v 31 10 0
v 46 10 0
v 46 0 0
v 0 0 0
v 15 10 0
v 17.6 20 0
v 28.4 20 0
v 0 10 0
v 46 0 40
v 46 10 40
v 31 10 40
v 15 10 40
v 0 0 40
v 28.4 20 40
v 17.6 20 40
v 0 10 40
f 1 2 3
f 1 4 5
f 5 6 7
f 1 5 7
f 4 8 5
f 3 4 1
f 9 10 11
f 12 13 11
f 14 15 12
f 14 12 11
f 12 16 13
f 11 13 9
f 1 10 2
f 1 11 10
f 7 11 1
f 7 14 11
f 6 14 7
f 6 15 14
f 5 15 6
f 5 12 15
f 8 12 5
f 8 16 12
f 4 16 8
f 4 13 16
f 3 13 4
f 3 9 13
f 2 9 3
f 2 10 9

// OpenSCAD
$fn = 32;

// ----------------------------------------------------------------------
// V guide rail: dovetail, 46 mm wide
// ----------------------------------------------------------------------

// --- parameters (mm) ---
rail_w = 46;              // rail width, X
base_t = 10;              // base plate thickness
v_depth = 10;             // V feature depth / height
v_half_w = 8;             // half width of the V at the base face
plate_t = 40;             // rail length, Z (the extrusion height)
top_half_w = 5.4;         // half width at the dovetail top

dovetail_base = 2 * v_half_w;  // dovetail width at the base
dovetail_top = 2 * top_half_w;  // dovetail width at the top

profile = [[0, 0], [46, 0], [46, 10], [31, 10], [28.4, 20], [17.6, 20], [15, 10], [0, 10]];  // primary outline, 8 points, counter clockwise

// --- the one profile operation ---
linear_extrude(height = plate_t) polygon(points = profile);
